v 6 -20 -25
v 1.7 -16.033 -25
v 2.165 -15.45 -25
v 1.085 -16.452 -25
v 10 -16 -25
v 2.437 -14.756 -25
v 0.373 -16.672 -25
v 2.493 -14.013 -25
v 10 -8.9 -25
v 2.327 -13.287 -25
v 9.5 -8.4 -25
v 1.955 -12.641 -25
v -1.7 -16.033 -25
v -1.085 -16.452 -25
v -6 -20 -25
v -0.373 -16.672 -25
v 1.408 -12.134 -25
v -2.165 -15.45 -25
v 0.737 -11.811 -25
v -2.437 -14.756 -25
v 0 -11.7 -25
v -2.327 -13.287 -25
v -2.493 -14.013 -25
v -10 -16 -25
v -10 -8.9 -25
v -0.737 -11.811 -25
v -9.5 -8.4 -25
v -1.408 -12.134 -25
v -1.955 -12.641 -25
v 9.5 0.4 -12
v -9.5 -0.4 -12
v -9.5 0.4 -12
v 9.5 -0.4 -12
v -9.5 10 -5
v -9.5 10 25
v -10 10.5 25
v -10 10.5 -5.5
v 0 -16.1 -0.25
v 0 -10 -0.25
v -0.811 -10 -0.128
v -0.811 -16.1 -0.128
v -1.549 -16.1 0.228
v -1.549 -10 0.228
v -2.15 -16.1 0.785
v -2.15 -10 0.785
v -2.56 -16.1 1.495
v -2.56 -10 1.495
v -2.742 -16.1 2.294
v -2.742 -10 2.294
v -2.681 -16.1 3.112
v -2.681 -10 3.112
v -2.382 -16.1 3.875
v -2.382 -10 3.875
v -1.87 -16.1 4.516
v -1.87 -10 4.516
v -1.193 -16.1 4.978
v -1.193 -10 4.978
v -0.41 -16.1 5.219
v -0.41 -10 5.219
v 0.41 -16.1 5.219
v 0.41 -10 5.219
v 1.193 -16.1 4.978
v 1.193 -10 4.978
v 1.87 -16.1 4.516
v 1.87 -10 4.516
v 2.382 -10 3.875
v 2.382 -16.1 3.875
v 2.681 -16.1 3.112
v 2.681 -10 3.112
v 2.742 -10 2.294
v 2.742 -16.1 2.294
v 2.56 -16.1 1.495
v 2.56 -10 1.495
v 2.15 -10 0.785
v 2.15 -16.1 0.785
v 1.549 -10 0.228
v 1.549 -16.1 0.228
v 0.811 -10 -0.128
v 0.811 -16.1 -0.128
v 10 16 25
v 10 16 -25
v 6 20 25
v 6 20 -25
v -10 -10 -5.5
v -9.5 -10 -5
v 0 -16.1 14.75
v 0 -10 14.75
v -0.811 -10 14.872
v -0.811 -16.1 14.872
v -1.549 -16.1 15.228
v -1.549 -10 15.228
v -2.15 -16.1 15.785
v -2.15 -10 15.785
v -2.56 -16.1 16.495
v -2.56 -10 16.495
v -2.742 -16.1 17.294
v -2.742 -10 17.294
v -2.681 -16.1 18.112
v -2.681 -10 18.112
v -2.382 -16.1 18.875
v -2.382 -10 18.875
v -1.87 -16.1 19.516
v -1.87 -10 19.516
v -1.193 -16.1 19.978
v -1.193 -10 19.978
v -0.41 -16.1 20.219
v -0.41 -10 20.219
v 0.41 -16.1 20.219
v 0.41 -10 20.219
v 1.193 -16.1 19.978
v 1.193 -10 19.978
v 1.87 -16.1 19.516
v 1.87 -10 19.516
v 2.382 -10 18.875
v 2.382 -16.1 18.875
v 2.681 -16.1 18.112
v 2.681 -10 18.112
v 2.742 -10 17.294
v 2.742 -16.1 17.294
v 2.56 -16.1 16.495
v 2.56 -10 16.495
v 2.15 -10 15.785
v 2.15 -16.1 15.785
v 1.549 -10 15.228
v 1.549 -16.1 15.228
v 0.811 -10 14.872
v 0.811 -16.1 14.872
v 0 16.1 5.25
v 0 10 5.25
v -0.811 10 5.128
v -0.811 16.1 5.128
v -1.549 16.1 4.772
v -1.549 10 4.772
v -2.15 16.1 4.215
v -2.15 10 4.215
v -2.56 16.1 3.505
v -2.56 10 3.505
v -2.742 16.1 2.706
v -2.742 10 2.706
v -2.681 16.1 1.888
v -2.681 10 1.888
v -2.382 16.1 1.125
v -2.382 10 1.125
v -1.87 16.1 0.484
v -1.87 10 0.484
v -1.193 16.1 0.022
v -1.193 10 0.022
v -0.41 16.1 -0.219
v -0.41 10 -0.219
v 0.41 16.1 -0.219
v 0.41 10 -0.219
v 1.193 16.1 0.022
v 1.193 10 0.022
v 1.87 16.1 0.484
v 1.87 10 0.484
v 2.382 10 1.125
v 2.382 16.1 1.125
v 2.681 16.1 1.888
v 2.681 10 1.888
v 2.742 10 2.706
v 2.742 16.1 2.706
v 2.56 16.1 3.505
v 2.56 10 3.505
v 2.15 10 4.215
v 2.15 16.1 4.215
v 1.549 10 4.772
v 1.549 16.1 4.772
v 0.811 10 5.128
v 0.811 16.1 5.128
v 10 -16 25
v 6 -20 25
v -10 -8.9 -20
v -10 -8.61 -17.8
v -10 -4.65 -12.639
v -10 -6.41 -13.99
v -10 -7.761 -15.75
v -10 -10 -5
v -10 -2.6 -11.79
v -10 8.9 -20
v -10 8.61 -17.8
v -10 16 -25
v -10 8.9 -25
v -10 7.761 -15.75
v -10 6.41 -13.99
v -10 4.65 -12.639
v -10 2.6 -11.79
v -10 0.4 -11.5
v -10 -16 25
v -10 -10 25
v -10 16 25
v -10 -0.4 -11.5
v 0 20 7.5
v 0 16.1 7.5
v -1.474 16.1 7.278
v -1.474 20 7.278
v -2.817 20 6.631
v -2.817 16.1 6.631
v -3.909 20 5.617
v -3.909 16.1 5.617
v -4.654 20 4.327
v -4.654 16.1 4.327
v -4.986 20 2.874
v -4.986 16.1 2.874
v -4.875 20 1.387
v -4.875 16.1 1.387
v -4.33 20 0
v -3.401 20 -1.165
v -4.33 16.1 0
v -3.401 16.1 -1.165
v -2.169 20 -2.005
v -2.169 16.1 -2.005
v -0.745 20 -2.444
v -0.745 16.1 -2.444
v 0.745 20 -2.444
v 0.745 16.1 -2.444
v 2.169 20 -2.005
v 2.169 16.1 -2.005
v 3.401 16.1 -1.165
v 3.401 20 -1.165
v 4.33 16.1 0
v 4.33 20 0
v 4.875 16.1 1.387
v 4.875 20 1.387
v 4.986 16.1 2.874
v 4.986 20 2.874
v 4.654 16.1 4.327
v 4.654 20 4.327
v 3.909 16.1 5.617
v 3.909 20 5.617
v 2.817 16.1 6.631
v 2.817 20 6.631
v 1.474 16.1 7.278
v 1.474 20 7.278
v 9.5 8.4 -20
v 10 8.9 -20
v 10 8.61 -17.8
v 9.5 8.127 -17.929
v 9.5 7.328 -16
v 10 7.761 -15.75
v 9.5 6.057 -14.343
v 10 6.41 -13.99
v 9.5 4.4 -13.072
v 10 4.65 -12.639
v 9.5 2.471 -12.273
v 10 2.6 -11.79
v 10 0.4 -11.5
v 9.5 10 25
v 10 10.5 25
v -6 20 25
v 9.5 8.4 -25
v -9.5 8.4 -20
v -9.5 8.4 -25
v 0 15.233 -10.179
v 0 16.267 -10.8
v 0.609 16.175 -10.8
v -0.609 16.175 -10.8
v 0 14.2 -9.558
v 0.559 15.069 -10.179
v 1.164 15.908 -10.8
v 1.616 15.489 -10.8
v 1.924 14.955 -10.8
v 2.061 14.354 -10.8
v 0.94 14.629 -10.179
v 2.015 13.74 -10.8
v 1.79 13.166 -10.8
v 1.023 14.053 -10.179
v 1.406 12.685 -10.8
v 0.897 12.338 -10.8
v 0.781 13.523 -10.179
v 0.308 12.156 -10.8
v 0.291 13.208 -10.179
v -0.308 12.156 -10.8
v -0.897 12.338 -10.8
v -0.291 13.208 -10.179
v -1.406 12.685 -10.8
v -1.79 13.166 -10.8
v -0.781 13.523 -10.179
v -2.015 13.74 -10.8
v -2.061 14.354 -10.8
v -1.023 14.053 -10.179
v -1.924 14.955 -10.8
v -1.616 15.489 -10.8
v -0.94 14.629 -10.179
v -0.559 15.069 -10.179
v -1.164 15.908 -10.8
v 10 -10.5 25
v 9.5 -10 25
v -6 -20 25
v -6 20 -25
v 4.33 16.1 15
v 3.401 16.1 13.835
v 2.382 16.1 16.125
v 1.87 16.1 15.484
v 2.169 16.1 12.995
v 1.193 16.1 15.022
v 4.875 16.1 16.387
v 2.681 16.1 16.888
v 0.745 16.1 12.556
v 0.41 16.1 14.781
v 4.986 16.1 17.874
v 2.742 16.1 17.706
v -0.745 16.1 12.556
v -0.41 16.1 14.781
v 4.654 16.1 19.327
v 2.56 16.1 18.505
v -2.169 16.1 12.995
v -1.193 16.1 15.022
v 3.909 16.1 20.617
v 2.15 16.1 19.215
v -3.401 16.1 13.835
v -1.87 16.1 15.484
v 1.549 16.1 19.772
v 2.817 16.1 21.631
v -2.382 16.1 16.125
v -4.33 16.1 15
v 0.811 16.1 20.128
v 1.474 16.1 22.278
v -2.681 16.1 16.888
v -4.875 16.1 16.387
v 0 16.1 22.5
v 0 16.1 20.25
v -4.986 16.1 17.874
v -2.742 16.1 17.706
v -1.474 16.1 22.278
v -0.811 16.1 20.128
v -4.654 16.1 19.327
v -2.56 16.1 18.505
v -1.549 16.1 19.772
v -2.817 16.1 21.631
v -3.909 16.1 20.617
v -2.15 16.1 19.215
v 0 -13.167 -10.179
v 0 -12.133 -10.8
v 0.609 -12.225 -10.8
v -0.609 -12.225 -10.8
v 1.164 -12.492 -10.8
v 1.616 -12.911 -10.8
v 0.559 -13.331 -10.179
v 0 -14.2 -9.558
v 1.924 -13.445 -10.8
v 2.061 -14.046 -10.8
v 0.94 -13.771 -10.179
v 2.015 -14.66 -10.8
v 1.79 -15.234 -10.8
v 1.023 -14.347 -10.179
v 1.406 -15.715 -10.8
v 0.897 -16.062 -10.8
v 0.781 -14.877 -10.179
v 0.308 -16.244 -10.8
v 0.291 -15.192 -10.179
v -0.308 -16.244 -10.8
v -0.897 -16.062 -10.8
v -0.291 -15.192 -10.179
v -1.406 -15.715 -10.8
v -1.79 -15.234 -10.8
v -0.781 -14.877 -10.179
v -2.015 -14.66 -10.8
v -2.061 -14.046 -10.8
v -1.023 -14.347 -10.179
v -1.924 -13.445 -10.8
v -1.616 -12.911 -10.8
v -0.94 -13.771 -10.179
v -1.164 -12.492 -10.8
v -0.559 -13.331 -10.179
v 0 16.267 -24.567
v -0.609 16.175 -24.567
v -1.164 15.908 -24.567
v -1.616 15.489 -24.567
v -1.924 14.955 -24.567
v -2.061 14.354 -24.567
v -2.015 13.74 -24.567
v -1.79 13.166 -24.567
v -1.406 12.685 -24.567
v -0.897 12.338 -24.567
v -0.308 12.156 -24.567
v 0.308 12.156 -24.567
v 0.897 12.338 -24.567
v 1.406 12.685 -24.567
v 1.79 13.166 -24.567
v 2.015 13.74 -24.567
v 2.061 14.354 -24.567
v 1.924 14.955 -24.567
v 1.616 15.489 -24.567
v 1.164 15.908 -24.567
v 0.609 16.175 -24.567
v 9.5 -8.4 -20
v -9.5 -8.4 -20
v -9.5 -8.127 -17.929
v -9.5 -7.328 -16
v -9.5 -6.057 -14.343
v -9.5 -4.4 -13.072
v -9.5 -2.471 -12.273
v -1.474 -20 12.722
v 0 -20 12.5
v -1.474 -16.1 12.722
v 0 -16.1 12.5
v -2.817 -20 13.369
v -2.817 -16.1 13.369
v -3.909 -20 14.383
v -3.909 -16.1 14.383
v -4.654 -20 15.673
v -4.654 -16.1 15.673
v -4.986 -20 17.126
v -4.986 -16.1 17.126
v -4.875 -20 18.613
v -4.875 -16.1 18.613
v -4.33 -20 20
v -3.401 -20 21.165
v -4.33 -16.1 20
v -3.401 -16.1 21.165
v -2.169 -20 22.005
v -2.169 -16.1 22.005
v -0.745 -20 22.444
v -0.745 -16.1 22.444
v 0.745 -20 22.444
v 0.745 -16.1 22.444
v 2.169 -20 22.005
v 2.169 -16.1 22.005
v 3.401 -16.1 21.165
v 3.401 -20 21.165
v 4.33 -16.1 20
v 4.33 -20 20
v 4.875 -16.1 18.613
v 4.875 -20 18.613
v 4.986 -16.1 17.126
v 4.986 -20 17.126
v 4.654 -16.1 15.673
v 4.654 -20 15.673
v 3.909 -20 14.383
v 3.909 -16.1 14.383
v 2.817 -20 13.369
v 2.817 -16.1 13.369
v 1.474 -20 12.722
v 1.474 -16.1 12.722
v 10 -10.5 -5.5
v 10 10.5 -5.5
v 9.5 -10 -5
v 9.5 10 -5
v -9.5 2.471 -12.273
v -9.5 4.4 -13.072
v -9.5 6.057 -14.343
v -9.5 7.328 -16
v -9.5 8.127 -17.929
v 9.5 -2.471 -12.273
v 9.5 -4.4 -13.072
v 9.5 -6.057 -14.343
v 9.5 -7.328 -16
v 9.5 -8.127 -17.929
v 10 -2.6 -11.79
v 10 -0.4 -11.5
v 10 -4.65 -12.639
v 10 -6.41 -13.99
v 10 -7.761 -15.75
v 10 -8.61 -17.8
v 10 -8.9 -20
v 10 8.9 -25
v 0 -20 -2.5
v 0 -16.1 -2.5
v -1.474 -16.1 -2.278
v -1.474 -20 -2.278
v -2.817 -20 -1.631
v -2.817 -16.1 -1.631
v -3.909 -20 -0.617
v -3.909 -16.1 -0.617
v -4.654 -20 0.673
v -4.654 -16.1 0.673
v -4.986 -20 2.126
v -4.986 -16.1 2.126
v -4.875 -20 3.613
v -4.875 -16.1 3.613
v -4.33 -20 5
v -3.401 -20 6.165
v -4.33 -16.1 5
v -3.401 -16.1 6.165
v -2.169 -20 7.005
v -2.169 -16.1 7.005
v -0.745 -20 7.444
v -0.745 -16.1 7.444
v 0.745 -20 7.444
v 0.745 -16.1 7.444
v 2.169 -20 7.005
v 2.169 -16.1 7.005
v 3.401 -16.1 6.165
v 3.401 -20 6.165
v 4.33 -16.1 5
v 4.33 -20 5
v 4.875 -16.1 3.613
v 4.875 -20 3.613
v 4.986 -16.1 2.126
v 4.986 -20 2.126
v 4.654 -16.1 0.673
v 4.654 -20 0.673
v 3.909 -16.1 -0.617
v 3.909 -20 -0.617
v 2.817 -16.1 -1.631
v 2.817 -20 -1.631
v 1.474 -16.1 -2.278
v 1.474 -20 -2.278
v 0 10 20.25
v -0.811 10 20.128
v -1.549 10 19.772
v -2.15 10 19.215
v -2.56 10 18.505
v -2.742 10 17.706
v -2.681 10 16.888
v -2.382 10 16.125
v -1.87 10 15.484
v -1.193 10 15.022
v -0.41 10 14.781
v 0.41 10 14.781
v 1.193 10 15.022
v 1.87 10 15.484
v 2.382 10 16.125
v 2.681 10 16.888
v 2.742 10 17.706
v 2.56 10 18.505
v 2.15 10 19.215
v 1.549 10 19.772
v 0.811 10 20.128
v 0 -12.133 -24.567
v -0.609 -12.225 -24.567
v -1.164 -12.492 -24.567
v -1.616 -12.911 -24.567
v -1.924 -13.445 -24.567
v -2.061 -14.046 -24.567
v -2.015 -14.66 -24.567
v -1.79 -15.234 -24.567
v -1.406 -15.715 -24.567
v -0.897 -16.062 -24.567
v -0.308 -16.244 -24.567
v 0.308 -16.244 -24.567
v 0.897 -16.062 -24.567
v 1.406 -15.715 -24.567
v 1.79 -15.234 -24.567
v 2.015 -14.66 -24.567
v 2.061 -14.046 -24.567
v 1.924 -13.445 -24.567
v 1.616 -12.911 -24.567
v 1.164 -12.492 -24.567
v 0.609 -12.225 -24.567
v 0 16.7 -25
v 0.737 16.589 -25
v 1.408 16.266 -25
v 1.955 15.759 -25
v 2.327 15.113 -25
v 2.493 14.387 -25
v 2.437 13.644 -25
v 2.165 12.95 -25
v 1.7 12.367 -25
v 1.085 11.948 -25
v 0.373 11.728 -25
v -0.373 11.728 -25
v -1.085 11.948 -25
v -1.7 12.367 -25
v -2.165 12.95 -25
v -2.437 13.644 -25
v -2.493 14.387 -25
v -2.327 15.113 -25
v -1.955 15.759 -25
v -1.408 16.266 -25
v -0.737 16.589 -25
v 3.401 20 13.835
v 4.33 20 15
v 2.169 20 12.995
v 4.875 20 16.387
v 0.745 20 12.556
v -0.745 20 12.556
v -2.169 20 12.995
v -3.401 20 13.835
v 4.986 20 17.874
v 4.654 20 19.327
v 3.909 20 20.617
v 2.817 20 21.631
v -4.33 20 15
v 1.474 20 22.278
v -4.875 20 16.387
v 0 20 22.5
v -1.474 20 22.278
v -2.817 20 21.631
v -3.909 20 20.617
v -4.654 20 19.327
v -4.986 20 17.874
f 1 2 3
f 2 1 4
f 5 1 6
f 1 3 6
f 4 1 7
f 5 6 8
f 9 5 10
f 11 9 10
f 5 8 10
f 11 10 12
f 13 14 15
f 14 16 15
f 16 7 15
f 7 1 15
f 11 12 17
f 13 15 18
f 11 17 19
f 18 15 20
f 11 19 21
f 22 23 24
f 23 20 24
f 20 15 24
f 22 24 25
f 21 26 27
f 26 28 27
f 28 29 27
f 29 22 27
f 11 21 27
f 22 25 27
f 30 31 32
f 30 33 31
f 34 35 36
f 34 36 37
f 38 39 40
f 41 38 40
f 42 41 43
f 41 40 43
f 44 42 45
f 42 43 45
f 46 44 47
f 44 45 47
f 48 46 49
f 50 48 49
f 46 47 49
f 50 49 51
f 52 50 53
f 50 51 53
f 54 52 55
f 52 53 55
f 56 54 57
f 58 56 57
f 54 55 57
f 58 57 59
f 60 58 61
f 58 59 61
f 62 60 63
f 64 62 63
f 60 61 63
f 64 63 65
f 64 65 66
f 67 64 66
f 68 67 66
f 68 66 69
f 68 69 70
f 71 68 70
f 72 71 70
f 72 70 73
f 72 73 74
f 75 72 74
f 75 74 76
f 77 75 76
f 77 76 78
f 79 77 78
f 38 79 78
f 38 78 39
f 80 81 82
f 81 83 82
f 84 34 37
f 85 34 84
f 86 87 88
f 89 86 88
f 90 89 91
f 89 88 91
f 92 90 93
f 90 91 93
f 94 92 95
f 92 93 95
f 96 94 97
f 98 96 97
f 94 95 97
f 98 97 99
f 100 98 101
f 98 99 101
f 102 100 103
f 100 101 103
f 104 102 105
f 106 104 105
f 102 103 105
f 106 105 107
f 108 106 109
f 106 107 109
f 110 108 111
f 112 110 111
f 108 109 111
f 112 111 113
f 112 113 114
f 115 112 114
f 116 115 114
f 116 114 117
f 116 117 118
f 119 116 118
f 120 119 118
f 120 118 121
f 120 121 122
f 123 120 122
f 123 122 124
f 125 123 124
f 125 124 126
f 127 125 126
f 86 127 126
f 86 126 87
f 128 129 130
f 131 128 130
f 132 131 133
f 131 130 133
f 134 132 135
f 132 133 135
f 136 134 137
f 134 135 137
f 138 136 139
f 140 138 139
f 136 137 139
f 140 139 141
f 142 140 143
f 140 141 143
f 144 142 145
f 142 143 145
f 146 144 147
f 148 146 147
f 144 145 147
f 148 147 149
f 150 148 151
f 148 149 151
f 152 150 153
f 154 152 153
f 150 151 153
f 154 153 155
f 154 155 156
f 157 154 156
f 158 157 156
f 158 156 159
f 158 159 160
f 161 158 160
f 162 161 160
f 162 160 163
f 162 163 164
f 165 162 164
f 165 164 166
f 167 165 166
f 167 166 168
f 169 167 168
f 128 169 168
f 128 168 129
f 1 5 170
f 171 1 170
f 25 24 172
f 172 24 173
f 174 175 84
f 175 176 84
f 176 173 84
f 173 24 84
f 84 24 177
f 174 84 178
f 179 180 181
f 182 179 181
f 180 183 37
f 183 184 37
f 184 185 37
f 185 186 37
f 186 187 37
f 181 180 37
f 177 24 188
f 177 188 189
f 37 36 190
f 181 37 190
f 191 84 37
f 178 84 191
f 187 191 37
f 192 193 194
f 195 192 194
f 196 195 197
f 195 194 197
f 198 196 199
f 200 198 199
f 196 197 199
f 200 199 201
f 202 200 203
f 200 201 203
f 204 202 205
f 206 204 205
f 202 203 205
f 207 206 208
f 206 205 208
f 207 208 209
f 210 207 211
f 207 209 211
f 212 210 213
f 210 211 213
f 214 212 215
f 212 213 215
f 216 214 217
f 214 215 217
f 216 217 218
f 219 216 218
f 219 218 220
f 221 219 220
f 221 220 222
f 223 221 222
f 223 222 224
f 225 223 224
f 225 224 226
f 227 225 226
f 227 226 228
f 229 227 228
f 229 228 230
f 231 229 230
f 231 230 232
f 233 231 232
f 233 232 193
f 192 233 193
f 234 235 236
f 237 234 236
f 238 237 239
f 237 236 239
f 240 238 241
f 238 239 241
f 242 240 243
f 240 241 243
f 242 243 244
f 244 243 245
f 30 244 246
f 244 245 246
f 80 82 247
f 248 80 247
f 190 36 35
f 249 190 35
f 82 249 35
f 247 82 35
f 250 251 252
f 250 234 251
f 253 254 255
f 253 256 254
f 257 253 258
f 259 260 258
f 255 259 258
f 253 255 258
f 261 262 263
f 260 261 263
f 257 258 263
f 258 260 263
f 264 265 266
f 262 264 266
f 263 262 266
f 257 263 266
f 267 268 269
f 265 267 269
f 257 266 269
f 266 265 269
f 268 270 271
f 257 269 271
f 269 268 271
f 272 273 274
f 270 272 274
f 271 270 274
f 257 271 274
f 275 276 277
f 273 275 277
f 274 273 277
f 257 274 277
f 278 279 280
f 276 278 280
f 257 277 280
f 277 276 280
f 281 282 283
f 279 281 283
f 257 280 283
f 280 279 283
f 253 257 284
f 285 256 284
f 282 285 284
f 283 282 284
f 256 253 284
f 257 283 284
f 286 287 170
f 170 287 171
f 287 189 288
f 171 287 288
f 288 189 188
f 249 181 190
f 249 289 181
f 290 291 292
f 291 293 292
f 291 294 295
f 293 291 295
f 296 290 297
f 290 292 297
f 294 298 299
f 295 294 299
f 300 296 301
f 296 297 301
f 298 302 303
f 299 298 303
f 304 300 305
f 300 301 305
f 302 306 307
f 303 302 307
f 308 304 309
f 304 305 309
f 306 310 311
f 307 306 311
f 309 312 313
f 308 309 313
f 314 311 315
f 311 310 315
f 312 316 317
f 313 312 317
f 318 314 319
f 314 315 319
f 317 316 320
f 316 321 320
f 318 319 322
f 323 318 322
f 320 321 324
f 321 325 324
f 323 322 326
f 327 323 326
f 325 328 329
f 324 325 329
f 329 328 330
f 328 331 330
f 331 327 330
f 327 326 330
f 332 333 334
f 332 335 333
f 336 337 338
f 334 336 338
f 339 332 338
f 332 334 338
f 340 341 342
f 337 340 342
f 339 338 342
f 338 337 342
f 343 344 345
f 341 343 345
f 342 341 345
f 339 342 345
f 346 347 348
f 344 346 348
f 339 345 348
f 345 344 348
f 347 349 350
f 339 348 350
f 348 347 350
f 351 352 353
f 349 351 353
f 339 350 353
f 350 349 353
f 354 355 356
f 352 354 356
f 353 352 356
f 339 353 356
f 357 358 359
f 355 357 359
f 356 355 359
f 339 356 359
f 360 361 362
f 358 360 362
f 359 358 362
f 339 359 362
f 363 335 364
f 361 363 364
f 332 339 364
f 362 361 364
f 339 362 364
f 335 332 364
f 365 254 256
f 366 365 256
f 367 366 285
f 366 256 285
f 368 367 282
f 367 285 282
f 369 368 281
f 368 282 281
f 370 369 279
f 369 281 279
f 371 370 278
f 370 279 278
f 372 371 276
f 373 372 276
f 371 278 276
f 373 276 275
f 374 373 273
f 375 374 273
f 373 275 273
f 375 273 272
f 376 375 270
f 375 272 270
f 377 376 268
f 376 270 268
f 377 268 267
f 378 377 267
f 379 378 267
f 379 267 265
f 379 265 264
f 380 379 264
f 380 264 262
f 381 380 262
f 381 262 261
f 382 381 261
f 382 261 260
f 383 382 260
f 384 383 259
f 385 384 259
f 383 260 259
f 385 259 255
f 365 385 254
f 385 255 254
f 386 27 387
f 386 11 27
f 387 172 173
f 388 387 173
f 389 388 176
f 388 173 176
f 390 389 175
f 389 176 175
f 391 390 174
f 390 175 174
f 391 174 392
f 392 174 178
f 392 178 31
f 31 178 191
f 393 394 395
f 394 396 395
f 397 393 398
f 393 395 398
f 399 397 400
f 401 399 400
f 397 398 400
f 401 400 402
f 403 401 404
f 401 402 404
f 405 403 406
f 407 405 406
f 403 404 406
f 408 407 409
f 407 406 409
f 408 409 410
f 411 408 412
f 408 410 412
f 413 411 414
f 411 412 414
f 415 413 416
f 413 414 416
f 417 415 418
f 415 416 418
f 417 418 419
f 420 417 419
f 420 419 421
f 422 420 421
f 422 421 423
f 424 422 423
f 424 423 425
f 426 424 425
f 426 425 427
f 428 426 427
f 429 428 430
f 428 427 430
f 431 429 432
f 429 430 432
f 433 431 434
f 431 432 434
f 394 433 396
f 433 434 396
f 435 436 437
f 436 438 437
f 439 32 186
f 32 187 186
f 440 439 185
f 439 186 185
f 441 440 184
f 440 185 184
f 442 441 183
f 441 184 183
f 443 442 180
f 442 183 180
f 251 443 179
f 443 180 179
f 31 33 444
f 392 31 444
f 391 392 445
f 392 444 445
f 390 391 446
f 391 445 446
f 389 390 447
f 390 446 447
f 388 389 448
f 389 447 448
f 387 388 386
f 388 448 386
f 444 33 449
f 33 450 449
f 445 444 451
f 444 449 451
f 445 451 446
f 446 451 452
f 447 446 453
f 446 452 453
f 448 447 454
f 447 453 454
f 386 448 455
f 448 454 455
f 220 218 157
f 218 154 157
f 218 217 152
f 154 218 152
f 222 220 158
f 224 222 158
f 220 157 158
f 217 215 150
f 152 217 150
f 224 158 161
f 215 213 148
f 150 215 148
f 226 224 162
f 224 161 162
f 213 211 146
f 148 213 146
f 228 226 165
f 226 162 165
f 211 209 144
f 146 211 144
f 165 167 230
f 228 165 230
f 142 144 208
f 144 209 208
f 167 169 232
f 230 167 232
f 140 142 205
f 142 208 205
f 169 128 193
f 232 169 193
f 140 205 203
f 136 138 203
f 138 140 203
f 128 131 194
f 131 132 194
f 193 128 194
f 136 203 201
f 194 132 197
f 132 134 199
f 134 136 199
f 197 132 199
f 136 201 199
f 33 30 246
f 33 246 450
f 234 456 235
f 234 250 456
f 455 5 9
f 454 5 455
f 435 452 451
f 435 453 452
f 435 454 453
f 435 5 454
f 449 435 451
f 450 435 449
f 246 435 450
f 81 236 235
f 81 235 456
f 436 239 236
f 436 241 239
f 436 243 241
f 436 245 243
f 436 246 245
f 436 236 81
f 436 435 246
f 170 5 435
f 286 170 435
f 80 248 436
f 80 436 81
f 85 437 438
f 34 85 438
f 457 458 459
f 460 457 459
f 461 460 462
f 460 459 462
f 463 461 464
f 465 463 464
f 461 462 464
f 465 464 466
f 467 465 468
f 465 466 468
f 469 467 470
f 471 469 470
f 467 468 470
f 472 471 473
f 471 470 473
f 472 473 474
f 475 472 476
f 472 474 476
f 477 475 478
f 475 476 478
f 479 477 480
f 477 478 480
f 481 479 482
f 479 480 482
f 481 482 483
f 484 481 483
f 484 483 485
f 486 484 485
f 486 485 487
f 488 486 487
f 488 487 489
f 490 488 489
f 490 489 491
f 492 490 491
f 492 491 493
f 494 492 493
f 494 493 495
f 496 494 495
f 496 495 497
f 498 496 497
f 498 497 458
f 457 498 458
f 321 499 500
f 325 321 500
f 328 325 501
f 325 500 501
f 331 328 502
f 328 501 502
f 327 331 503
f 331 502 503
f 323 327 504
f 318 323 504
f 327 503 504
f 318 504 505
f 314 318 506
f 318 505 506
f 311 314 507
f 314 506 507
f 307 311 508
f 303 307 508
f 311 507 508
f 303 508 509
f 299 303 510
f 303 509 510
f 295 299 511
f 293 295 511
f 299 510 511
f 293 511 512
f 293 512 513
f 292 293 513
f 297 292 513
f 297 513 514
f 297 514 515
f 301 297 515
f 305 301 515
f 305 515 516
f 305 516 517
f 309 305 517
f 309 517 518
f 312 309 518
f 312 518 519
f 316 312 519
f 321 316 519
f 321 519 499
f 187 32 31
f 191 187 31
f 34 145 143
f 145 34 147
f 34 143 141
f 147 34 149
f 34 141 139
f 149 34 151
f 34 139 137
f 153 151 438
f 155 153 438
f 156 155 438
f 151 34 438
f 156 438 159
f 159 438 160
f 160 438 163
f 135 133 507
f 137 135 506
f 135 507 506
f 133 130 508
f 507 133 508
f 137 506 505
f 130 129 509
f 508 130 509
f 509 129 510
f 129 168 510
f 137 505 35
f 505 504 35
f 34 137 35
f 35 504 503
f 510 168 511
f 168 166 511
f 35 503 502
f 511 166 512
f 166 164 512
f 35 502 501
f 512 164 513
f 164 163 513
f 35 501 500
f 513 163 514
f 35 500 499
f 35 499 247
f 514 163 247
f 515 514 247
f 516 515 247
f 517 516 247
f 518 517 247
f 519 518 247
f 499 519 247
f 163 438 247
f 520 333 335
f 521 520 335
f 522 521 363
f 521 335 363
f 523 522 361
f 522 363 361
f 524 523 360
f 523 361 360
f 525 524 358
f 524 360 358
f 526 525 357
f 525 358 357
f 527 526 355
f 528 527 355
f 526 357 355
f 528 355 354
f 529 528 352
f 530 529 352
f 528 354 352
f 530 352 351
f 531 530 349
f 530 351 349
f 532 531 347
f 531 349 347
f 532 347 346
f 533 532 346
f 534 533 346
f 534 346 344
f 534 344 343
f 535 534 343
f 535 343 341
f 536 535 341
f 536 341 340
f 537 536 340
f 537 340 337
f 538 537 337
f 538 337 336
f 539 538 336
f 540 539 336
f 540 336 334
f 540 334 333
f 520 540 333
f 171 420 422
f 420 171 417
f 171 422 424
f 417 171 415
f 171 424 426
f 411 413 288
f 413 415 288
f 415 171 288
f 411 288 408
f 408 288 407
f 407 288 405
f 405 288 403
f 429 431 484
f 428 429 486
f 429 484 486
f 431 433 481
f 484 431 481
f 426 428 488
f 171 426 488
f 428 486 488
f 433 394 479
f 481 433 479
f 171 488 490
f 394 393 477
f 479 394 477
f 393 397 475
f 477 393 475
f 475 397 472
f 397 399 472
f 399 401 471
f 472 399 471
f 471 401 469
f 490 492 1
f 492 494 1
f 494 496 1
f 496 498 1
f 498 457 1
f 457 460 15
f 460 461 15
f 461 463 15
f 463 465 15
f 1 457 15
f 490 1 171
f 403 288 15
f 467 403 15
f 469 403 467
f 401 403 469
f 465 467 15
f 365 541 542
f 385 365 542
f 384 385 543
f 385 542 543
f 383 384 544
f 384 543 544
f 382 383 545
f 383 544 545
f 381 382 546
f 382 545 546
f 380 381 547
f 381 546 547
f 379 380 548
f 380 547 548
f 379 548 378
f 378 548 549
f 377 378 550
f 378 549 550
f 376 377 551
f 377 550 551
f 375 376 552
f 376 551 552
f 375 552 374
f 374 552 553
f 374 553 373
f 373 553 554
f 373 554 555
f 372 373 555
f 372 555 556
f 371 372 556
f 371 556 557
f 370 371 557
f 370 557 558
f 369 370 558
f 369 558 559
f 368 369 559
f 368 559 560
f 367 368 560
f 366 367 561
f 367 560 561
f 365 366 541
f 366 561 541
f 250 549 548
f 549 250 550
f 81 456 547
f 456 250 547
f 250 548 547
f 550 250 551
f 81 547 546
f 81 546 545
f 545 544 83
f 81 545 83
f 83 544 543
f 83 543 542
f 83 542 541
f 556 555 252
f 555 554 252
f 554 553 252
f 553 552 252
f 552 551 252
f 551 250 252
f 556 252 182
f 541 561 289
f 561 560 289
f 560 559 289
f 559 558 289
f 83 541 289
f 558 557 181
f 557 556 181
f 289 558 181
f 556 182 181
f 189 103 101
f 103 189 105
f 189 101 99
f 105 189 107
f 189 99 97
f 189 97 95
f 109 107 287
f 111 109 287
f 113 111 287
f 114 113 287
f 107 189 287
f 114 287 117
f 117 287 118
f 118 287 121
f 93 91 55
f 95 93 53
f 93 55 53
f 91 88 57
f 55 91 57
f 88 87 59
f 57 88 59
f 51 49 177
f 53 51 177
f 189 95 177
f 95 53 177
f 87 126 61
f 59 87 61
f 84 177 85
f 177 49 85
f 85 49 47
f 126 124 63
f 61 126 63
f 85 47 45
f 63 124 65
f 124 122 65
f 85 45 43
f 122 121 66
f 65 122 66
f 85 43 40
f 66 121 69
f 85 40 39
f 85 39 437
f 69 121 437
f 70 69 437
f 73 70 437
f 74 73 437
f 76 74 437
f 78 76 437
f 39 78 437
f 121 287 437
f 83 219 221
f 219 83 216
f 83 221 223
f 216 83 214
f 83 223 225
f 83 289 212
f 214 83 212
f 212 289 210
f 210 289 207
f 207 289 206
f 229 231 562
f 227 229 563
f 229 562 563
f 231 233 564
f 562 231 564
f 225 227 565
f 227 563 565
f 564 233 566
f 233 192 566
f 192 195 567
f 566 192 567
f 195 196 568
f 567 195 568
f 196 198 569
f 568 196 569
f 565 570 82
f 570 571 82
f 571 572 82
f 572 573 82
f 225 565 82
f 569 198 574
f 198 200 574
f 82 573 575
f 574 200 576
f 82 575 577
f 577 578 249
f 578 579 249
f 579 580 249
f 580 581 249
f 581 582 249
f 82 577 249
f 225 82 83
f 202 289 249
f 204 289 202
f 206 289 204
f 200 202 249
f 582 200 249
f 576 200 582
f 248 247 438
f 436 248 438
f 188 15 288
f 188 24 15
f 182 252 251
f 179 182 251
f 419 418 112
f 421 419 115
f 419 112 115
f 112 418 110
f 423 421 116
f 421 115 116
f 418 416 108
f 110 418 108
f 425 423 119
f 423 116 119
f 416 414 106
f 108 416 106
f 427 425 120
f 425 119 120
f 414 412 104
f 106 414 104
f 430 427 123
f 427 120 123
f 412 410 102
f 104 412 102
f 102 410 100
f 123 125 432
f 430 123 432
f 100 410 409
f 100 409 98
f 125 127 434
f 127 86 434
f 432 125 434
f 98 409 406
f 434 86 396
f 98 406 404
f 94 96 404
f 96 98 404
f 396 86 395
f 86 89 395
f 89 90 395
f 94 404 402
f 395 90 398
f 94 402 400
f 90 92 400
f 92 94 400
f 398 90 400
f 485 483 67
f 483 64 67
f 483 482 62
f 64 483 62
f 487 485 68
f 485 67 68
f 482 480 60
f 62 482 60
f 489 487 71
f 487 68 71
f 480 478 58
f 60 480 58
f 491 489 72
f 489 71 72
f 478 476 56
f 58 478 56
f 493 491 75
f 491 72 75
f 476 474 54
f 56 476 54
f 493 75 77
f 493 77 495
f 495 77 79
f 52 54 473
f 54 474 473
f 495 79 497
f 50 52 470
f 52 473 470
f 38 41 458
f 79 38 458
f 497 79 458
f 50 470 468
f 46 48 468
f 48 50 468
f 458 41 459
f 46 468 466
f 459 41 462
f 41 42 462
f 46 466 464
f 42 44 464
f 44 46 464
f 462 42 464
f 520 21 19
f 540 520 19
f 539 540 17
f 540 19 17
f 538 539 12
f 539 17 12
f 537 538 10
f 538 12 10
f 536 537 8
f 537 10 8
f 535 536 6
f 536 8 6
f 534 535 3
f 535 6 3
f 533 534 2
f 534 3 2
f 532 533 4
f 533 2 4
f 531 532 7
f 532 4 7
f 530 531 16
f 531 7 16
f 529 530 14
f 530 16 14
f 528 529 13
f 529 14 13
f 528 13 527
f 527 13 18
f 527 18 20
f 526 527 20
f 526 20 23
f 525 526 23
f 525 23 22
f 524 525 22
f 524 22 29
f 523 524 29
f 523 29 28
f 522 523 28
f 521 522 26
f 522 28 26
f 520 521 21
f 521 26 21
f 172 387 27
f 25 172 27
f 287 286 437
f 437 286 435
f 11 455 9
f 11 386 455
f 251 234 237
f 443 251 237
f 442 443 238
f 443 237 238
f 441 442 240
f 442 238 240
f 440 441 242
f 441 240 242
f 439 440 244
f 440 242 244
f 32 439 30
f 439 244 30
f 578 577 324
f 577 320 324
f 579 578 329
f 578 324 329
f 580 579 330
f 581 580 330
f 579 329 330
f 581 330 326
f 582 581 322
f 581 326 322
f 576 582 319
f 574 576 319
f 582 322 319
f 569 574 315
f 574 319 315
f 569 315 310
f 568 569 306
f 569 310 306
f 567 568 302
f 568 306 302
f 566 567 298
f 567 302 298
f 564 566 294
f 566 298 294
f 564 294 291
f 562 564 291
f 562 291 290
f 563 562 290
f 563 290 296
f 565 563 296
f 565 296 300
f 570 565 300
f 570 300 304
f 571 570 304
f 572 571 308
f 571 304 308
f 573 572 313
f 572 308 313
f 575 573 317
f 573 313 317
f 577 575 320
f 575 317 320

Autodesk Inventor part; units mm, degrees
ref_plane "YZ Plane" through (0, 0, 0) normal (1, 0, 0) x (0, 1, 0)
ref_plane "XZ Plane" through (0, 0, 0) normal (0, 1, 0) x (-1, 0, 0)
ref_plane "XY Plane" through (0, 0, 0) normal (0, 0, 1) x (1, 0, 0)
sketch "Skizze1" plane through (0, 0, 0) normal (1, 0, 0) x (0, 1, 0)
  line L0 (-28, 0) -> (28, 0) construction
  line L1 (0, 35) -> (0, -35) construction
  line L2 (-20, -25) -> (20, -25)
  line L3 (20, -25) -> (20, 25)
  line L4 (20, 25) -> (-20, 25)
  line L5 (-20, 25) -> (-20, -25)
  line L6 (-20, -25) -> (20, 25) construction
  line L7 (20, -25) -> (-20, 25) construction
  point P0 (0, 0)
  dimension "d0" = 40
  dimension "d1" = 50
extrude "Grundkörper" add sketch "Skizze1" along normal mid plane 20
sketch "Skizze2" plane through (10, 0, 0) normal (1, 0, 0) x (0, 0, -1)
  line L0 (-25, 20) -> (-25, -20) construction
  line L1 (0, -28) -> (0, 28) construction
  line L2 (-35, 0) -> (35, 0) construction
  line L3 (-25, -10) -> (5, -10)
  line L4 (5, -10) -> (5, 10)
  line L5 (5, 10) -> (-25, 10)
  line L6 (-25, 10) -> (-25, -10)
  line L7 (25, -20) -> (25, 20) construction
  line L8 (25, -8.4) -> (20, -8.4)
  line L9 (12, -0.4) -> (12, 0.4)
  line L10 (20, 8.4) -> (25, 8.4)
  line L11 (25, -8.4) -> (25, 8.4)
  arc A0 (12, -0.4) -> (20, -8.4) centre (20, -0.4) ccw
  arc A1 (20, 8.4) -> (12, 0.4) centre (20, 0.4) ccw
  point P0 (0, 0)
  dimension "d4" = 30
  dimension "d5" = 20
  dimension "d14" = 13
  dimension "d15" = 16.8
  dimension "d16" = 8
extrude "Ausschnitt" cut sketch "Skizze2" against normal through all
sketch "Skizze4" plane through (-10, -20, -25) normal (0, -1, 0) x (1, 0, 0)
  line L0 (20, 20) -> (0, 20) construction
  line L1 (20, 50) -> (0, 50) construction
  line L2 (10, 60) -> (10, -10) projected
  line L3 (0, 35) -> (20, 35) construction
  line L4 (0, 0) -> (0, 50) construction
  line L5 (20, 50) -> (20, 0) construction
  point P0 (10, 25)
  point P1 (10, 42.5)
  point P2 (10, 27.5)
  dimension "d19" = 30
  dimension "d20" = 15
  dimension "d21" = 15
hole "DIN7984_M5_Boh" at (0, -20, 17.5) at (0, -20, 2.5) direction (0, 1, 0) diameter 5.5 end up to surface counterbore diameter 10 counterbore depth 3.9
mirror "Spiegeln_DIN7984_M5_Boh" about plane through (0, 0, 0) normal (0, 1, 0) of "DIN7984_M5_Boh"
sketch "Skizze5" plane through (10, -20, -25) normal (0, 0, -1) x (-1, 0, 0)
  line L0 (0, 0) -> (20, 0) construction
  line L1 (20, 11.6) -> (0, 11.6) construction
  line L2 (20, 40) -> (0, 40) construction
  line L3 (0, 28.4) -> (20, 28.4) construction
  line L4 (10, -8) -> (10, 48) construction
  line L5 (-4, 20) -> (24, 20) construction
  line L6 (10, 11.6) -> (10, 0) construction
  point P0 (10, 20)
  point P1 (10, 5.8)
  point P2 (10, 34.2)
  dimension "d29" = 28.4
hole "M5x10" at (0, -14.2, -25) at (0, 14.2, -25) direction (0, 0, 1) diameter 4.134 depth 14.2 tip angle 118 countersink diameter 5 countersink angle 90 thread size "M5x0.8" class "6H" standard "ISO Metric profile"
sketch "Skizze" plane through (10, -20, -25) normal (0, 0, -1) x (-1, 0, 0)
  circle A0 centre (10, 5.8) radius 2.5 projected
  line L0 (20, 11.6) -> (0, 11.6) projected
  line L1 (0, 0) -> (0, 11.6) projected
  line L2 (0, 0) -> (20, 0) projected
  line L3 (20, 11.6) -> (20, 0) projected
  circle A1 centre (10, 34.2) radius 2.5 projected
  line L4 (0, 28.4) -> (20, 28.4) projected
  line L5 (20, 40) -> (20, 28.4) projected
  line L6 (20, 40) -> (0, 40) projected
  line L7 (0, 28.4) -> (0, 40) projected
  line L8 (0, 11.6) -> (0, 19.6) projected
  line L9 (0, 19.6) -> (0, 20.4) projected
  line L10 (0, 20.4) -> (0, 28.4) projected
  line L11 (20, 28.4) -> (20, 20.4) projected
  line L12 (20, 20.4) -> (20, 19.6) projected
  line L13 (20, 19.6) -> (20, 11.6) projected
  point P0 (10, 20)
chamfer "Fase_Allgemein" distance 4 angle 45 4 edges at (10, -20, 0) (-10, -20, 0) (10, 20, 0) (-10, 20, 0)
chamfer "Fase" distance 0.5 angle 45 15 edges at (10, -6.0569, -14.3431) (10, 0, -12) (10, 6.0569, -14.3431) (10, 8.4, -22.5) (10, -8.4, -22.5) (-10, 6.0569, -14.3431) (-10, 0, -12) (-10, -6.0569, -14.3431) (-10, -8.4, -22.5) (-10, 8.4, -22.5) (-10, 0, -5) (-10, 10, 10) (10, -10, 10) (10, 0, -5) (10, 10, 10)
equation "\"d20\" = 0.5 * d19"
equation "\"d21\" = 0.5 * d19"
properties part number "200-50-WHEEL-CONNECTOR-20MM-01" material "Aluminium 6061"
